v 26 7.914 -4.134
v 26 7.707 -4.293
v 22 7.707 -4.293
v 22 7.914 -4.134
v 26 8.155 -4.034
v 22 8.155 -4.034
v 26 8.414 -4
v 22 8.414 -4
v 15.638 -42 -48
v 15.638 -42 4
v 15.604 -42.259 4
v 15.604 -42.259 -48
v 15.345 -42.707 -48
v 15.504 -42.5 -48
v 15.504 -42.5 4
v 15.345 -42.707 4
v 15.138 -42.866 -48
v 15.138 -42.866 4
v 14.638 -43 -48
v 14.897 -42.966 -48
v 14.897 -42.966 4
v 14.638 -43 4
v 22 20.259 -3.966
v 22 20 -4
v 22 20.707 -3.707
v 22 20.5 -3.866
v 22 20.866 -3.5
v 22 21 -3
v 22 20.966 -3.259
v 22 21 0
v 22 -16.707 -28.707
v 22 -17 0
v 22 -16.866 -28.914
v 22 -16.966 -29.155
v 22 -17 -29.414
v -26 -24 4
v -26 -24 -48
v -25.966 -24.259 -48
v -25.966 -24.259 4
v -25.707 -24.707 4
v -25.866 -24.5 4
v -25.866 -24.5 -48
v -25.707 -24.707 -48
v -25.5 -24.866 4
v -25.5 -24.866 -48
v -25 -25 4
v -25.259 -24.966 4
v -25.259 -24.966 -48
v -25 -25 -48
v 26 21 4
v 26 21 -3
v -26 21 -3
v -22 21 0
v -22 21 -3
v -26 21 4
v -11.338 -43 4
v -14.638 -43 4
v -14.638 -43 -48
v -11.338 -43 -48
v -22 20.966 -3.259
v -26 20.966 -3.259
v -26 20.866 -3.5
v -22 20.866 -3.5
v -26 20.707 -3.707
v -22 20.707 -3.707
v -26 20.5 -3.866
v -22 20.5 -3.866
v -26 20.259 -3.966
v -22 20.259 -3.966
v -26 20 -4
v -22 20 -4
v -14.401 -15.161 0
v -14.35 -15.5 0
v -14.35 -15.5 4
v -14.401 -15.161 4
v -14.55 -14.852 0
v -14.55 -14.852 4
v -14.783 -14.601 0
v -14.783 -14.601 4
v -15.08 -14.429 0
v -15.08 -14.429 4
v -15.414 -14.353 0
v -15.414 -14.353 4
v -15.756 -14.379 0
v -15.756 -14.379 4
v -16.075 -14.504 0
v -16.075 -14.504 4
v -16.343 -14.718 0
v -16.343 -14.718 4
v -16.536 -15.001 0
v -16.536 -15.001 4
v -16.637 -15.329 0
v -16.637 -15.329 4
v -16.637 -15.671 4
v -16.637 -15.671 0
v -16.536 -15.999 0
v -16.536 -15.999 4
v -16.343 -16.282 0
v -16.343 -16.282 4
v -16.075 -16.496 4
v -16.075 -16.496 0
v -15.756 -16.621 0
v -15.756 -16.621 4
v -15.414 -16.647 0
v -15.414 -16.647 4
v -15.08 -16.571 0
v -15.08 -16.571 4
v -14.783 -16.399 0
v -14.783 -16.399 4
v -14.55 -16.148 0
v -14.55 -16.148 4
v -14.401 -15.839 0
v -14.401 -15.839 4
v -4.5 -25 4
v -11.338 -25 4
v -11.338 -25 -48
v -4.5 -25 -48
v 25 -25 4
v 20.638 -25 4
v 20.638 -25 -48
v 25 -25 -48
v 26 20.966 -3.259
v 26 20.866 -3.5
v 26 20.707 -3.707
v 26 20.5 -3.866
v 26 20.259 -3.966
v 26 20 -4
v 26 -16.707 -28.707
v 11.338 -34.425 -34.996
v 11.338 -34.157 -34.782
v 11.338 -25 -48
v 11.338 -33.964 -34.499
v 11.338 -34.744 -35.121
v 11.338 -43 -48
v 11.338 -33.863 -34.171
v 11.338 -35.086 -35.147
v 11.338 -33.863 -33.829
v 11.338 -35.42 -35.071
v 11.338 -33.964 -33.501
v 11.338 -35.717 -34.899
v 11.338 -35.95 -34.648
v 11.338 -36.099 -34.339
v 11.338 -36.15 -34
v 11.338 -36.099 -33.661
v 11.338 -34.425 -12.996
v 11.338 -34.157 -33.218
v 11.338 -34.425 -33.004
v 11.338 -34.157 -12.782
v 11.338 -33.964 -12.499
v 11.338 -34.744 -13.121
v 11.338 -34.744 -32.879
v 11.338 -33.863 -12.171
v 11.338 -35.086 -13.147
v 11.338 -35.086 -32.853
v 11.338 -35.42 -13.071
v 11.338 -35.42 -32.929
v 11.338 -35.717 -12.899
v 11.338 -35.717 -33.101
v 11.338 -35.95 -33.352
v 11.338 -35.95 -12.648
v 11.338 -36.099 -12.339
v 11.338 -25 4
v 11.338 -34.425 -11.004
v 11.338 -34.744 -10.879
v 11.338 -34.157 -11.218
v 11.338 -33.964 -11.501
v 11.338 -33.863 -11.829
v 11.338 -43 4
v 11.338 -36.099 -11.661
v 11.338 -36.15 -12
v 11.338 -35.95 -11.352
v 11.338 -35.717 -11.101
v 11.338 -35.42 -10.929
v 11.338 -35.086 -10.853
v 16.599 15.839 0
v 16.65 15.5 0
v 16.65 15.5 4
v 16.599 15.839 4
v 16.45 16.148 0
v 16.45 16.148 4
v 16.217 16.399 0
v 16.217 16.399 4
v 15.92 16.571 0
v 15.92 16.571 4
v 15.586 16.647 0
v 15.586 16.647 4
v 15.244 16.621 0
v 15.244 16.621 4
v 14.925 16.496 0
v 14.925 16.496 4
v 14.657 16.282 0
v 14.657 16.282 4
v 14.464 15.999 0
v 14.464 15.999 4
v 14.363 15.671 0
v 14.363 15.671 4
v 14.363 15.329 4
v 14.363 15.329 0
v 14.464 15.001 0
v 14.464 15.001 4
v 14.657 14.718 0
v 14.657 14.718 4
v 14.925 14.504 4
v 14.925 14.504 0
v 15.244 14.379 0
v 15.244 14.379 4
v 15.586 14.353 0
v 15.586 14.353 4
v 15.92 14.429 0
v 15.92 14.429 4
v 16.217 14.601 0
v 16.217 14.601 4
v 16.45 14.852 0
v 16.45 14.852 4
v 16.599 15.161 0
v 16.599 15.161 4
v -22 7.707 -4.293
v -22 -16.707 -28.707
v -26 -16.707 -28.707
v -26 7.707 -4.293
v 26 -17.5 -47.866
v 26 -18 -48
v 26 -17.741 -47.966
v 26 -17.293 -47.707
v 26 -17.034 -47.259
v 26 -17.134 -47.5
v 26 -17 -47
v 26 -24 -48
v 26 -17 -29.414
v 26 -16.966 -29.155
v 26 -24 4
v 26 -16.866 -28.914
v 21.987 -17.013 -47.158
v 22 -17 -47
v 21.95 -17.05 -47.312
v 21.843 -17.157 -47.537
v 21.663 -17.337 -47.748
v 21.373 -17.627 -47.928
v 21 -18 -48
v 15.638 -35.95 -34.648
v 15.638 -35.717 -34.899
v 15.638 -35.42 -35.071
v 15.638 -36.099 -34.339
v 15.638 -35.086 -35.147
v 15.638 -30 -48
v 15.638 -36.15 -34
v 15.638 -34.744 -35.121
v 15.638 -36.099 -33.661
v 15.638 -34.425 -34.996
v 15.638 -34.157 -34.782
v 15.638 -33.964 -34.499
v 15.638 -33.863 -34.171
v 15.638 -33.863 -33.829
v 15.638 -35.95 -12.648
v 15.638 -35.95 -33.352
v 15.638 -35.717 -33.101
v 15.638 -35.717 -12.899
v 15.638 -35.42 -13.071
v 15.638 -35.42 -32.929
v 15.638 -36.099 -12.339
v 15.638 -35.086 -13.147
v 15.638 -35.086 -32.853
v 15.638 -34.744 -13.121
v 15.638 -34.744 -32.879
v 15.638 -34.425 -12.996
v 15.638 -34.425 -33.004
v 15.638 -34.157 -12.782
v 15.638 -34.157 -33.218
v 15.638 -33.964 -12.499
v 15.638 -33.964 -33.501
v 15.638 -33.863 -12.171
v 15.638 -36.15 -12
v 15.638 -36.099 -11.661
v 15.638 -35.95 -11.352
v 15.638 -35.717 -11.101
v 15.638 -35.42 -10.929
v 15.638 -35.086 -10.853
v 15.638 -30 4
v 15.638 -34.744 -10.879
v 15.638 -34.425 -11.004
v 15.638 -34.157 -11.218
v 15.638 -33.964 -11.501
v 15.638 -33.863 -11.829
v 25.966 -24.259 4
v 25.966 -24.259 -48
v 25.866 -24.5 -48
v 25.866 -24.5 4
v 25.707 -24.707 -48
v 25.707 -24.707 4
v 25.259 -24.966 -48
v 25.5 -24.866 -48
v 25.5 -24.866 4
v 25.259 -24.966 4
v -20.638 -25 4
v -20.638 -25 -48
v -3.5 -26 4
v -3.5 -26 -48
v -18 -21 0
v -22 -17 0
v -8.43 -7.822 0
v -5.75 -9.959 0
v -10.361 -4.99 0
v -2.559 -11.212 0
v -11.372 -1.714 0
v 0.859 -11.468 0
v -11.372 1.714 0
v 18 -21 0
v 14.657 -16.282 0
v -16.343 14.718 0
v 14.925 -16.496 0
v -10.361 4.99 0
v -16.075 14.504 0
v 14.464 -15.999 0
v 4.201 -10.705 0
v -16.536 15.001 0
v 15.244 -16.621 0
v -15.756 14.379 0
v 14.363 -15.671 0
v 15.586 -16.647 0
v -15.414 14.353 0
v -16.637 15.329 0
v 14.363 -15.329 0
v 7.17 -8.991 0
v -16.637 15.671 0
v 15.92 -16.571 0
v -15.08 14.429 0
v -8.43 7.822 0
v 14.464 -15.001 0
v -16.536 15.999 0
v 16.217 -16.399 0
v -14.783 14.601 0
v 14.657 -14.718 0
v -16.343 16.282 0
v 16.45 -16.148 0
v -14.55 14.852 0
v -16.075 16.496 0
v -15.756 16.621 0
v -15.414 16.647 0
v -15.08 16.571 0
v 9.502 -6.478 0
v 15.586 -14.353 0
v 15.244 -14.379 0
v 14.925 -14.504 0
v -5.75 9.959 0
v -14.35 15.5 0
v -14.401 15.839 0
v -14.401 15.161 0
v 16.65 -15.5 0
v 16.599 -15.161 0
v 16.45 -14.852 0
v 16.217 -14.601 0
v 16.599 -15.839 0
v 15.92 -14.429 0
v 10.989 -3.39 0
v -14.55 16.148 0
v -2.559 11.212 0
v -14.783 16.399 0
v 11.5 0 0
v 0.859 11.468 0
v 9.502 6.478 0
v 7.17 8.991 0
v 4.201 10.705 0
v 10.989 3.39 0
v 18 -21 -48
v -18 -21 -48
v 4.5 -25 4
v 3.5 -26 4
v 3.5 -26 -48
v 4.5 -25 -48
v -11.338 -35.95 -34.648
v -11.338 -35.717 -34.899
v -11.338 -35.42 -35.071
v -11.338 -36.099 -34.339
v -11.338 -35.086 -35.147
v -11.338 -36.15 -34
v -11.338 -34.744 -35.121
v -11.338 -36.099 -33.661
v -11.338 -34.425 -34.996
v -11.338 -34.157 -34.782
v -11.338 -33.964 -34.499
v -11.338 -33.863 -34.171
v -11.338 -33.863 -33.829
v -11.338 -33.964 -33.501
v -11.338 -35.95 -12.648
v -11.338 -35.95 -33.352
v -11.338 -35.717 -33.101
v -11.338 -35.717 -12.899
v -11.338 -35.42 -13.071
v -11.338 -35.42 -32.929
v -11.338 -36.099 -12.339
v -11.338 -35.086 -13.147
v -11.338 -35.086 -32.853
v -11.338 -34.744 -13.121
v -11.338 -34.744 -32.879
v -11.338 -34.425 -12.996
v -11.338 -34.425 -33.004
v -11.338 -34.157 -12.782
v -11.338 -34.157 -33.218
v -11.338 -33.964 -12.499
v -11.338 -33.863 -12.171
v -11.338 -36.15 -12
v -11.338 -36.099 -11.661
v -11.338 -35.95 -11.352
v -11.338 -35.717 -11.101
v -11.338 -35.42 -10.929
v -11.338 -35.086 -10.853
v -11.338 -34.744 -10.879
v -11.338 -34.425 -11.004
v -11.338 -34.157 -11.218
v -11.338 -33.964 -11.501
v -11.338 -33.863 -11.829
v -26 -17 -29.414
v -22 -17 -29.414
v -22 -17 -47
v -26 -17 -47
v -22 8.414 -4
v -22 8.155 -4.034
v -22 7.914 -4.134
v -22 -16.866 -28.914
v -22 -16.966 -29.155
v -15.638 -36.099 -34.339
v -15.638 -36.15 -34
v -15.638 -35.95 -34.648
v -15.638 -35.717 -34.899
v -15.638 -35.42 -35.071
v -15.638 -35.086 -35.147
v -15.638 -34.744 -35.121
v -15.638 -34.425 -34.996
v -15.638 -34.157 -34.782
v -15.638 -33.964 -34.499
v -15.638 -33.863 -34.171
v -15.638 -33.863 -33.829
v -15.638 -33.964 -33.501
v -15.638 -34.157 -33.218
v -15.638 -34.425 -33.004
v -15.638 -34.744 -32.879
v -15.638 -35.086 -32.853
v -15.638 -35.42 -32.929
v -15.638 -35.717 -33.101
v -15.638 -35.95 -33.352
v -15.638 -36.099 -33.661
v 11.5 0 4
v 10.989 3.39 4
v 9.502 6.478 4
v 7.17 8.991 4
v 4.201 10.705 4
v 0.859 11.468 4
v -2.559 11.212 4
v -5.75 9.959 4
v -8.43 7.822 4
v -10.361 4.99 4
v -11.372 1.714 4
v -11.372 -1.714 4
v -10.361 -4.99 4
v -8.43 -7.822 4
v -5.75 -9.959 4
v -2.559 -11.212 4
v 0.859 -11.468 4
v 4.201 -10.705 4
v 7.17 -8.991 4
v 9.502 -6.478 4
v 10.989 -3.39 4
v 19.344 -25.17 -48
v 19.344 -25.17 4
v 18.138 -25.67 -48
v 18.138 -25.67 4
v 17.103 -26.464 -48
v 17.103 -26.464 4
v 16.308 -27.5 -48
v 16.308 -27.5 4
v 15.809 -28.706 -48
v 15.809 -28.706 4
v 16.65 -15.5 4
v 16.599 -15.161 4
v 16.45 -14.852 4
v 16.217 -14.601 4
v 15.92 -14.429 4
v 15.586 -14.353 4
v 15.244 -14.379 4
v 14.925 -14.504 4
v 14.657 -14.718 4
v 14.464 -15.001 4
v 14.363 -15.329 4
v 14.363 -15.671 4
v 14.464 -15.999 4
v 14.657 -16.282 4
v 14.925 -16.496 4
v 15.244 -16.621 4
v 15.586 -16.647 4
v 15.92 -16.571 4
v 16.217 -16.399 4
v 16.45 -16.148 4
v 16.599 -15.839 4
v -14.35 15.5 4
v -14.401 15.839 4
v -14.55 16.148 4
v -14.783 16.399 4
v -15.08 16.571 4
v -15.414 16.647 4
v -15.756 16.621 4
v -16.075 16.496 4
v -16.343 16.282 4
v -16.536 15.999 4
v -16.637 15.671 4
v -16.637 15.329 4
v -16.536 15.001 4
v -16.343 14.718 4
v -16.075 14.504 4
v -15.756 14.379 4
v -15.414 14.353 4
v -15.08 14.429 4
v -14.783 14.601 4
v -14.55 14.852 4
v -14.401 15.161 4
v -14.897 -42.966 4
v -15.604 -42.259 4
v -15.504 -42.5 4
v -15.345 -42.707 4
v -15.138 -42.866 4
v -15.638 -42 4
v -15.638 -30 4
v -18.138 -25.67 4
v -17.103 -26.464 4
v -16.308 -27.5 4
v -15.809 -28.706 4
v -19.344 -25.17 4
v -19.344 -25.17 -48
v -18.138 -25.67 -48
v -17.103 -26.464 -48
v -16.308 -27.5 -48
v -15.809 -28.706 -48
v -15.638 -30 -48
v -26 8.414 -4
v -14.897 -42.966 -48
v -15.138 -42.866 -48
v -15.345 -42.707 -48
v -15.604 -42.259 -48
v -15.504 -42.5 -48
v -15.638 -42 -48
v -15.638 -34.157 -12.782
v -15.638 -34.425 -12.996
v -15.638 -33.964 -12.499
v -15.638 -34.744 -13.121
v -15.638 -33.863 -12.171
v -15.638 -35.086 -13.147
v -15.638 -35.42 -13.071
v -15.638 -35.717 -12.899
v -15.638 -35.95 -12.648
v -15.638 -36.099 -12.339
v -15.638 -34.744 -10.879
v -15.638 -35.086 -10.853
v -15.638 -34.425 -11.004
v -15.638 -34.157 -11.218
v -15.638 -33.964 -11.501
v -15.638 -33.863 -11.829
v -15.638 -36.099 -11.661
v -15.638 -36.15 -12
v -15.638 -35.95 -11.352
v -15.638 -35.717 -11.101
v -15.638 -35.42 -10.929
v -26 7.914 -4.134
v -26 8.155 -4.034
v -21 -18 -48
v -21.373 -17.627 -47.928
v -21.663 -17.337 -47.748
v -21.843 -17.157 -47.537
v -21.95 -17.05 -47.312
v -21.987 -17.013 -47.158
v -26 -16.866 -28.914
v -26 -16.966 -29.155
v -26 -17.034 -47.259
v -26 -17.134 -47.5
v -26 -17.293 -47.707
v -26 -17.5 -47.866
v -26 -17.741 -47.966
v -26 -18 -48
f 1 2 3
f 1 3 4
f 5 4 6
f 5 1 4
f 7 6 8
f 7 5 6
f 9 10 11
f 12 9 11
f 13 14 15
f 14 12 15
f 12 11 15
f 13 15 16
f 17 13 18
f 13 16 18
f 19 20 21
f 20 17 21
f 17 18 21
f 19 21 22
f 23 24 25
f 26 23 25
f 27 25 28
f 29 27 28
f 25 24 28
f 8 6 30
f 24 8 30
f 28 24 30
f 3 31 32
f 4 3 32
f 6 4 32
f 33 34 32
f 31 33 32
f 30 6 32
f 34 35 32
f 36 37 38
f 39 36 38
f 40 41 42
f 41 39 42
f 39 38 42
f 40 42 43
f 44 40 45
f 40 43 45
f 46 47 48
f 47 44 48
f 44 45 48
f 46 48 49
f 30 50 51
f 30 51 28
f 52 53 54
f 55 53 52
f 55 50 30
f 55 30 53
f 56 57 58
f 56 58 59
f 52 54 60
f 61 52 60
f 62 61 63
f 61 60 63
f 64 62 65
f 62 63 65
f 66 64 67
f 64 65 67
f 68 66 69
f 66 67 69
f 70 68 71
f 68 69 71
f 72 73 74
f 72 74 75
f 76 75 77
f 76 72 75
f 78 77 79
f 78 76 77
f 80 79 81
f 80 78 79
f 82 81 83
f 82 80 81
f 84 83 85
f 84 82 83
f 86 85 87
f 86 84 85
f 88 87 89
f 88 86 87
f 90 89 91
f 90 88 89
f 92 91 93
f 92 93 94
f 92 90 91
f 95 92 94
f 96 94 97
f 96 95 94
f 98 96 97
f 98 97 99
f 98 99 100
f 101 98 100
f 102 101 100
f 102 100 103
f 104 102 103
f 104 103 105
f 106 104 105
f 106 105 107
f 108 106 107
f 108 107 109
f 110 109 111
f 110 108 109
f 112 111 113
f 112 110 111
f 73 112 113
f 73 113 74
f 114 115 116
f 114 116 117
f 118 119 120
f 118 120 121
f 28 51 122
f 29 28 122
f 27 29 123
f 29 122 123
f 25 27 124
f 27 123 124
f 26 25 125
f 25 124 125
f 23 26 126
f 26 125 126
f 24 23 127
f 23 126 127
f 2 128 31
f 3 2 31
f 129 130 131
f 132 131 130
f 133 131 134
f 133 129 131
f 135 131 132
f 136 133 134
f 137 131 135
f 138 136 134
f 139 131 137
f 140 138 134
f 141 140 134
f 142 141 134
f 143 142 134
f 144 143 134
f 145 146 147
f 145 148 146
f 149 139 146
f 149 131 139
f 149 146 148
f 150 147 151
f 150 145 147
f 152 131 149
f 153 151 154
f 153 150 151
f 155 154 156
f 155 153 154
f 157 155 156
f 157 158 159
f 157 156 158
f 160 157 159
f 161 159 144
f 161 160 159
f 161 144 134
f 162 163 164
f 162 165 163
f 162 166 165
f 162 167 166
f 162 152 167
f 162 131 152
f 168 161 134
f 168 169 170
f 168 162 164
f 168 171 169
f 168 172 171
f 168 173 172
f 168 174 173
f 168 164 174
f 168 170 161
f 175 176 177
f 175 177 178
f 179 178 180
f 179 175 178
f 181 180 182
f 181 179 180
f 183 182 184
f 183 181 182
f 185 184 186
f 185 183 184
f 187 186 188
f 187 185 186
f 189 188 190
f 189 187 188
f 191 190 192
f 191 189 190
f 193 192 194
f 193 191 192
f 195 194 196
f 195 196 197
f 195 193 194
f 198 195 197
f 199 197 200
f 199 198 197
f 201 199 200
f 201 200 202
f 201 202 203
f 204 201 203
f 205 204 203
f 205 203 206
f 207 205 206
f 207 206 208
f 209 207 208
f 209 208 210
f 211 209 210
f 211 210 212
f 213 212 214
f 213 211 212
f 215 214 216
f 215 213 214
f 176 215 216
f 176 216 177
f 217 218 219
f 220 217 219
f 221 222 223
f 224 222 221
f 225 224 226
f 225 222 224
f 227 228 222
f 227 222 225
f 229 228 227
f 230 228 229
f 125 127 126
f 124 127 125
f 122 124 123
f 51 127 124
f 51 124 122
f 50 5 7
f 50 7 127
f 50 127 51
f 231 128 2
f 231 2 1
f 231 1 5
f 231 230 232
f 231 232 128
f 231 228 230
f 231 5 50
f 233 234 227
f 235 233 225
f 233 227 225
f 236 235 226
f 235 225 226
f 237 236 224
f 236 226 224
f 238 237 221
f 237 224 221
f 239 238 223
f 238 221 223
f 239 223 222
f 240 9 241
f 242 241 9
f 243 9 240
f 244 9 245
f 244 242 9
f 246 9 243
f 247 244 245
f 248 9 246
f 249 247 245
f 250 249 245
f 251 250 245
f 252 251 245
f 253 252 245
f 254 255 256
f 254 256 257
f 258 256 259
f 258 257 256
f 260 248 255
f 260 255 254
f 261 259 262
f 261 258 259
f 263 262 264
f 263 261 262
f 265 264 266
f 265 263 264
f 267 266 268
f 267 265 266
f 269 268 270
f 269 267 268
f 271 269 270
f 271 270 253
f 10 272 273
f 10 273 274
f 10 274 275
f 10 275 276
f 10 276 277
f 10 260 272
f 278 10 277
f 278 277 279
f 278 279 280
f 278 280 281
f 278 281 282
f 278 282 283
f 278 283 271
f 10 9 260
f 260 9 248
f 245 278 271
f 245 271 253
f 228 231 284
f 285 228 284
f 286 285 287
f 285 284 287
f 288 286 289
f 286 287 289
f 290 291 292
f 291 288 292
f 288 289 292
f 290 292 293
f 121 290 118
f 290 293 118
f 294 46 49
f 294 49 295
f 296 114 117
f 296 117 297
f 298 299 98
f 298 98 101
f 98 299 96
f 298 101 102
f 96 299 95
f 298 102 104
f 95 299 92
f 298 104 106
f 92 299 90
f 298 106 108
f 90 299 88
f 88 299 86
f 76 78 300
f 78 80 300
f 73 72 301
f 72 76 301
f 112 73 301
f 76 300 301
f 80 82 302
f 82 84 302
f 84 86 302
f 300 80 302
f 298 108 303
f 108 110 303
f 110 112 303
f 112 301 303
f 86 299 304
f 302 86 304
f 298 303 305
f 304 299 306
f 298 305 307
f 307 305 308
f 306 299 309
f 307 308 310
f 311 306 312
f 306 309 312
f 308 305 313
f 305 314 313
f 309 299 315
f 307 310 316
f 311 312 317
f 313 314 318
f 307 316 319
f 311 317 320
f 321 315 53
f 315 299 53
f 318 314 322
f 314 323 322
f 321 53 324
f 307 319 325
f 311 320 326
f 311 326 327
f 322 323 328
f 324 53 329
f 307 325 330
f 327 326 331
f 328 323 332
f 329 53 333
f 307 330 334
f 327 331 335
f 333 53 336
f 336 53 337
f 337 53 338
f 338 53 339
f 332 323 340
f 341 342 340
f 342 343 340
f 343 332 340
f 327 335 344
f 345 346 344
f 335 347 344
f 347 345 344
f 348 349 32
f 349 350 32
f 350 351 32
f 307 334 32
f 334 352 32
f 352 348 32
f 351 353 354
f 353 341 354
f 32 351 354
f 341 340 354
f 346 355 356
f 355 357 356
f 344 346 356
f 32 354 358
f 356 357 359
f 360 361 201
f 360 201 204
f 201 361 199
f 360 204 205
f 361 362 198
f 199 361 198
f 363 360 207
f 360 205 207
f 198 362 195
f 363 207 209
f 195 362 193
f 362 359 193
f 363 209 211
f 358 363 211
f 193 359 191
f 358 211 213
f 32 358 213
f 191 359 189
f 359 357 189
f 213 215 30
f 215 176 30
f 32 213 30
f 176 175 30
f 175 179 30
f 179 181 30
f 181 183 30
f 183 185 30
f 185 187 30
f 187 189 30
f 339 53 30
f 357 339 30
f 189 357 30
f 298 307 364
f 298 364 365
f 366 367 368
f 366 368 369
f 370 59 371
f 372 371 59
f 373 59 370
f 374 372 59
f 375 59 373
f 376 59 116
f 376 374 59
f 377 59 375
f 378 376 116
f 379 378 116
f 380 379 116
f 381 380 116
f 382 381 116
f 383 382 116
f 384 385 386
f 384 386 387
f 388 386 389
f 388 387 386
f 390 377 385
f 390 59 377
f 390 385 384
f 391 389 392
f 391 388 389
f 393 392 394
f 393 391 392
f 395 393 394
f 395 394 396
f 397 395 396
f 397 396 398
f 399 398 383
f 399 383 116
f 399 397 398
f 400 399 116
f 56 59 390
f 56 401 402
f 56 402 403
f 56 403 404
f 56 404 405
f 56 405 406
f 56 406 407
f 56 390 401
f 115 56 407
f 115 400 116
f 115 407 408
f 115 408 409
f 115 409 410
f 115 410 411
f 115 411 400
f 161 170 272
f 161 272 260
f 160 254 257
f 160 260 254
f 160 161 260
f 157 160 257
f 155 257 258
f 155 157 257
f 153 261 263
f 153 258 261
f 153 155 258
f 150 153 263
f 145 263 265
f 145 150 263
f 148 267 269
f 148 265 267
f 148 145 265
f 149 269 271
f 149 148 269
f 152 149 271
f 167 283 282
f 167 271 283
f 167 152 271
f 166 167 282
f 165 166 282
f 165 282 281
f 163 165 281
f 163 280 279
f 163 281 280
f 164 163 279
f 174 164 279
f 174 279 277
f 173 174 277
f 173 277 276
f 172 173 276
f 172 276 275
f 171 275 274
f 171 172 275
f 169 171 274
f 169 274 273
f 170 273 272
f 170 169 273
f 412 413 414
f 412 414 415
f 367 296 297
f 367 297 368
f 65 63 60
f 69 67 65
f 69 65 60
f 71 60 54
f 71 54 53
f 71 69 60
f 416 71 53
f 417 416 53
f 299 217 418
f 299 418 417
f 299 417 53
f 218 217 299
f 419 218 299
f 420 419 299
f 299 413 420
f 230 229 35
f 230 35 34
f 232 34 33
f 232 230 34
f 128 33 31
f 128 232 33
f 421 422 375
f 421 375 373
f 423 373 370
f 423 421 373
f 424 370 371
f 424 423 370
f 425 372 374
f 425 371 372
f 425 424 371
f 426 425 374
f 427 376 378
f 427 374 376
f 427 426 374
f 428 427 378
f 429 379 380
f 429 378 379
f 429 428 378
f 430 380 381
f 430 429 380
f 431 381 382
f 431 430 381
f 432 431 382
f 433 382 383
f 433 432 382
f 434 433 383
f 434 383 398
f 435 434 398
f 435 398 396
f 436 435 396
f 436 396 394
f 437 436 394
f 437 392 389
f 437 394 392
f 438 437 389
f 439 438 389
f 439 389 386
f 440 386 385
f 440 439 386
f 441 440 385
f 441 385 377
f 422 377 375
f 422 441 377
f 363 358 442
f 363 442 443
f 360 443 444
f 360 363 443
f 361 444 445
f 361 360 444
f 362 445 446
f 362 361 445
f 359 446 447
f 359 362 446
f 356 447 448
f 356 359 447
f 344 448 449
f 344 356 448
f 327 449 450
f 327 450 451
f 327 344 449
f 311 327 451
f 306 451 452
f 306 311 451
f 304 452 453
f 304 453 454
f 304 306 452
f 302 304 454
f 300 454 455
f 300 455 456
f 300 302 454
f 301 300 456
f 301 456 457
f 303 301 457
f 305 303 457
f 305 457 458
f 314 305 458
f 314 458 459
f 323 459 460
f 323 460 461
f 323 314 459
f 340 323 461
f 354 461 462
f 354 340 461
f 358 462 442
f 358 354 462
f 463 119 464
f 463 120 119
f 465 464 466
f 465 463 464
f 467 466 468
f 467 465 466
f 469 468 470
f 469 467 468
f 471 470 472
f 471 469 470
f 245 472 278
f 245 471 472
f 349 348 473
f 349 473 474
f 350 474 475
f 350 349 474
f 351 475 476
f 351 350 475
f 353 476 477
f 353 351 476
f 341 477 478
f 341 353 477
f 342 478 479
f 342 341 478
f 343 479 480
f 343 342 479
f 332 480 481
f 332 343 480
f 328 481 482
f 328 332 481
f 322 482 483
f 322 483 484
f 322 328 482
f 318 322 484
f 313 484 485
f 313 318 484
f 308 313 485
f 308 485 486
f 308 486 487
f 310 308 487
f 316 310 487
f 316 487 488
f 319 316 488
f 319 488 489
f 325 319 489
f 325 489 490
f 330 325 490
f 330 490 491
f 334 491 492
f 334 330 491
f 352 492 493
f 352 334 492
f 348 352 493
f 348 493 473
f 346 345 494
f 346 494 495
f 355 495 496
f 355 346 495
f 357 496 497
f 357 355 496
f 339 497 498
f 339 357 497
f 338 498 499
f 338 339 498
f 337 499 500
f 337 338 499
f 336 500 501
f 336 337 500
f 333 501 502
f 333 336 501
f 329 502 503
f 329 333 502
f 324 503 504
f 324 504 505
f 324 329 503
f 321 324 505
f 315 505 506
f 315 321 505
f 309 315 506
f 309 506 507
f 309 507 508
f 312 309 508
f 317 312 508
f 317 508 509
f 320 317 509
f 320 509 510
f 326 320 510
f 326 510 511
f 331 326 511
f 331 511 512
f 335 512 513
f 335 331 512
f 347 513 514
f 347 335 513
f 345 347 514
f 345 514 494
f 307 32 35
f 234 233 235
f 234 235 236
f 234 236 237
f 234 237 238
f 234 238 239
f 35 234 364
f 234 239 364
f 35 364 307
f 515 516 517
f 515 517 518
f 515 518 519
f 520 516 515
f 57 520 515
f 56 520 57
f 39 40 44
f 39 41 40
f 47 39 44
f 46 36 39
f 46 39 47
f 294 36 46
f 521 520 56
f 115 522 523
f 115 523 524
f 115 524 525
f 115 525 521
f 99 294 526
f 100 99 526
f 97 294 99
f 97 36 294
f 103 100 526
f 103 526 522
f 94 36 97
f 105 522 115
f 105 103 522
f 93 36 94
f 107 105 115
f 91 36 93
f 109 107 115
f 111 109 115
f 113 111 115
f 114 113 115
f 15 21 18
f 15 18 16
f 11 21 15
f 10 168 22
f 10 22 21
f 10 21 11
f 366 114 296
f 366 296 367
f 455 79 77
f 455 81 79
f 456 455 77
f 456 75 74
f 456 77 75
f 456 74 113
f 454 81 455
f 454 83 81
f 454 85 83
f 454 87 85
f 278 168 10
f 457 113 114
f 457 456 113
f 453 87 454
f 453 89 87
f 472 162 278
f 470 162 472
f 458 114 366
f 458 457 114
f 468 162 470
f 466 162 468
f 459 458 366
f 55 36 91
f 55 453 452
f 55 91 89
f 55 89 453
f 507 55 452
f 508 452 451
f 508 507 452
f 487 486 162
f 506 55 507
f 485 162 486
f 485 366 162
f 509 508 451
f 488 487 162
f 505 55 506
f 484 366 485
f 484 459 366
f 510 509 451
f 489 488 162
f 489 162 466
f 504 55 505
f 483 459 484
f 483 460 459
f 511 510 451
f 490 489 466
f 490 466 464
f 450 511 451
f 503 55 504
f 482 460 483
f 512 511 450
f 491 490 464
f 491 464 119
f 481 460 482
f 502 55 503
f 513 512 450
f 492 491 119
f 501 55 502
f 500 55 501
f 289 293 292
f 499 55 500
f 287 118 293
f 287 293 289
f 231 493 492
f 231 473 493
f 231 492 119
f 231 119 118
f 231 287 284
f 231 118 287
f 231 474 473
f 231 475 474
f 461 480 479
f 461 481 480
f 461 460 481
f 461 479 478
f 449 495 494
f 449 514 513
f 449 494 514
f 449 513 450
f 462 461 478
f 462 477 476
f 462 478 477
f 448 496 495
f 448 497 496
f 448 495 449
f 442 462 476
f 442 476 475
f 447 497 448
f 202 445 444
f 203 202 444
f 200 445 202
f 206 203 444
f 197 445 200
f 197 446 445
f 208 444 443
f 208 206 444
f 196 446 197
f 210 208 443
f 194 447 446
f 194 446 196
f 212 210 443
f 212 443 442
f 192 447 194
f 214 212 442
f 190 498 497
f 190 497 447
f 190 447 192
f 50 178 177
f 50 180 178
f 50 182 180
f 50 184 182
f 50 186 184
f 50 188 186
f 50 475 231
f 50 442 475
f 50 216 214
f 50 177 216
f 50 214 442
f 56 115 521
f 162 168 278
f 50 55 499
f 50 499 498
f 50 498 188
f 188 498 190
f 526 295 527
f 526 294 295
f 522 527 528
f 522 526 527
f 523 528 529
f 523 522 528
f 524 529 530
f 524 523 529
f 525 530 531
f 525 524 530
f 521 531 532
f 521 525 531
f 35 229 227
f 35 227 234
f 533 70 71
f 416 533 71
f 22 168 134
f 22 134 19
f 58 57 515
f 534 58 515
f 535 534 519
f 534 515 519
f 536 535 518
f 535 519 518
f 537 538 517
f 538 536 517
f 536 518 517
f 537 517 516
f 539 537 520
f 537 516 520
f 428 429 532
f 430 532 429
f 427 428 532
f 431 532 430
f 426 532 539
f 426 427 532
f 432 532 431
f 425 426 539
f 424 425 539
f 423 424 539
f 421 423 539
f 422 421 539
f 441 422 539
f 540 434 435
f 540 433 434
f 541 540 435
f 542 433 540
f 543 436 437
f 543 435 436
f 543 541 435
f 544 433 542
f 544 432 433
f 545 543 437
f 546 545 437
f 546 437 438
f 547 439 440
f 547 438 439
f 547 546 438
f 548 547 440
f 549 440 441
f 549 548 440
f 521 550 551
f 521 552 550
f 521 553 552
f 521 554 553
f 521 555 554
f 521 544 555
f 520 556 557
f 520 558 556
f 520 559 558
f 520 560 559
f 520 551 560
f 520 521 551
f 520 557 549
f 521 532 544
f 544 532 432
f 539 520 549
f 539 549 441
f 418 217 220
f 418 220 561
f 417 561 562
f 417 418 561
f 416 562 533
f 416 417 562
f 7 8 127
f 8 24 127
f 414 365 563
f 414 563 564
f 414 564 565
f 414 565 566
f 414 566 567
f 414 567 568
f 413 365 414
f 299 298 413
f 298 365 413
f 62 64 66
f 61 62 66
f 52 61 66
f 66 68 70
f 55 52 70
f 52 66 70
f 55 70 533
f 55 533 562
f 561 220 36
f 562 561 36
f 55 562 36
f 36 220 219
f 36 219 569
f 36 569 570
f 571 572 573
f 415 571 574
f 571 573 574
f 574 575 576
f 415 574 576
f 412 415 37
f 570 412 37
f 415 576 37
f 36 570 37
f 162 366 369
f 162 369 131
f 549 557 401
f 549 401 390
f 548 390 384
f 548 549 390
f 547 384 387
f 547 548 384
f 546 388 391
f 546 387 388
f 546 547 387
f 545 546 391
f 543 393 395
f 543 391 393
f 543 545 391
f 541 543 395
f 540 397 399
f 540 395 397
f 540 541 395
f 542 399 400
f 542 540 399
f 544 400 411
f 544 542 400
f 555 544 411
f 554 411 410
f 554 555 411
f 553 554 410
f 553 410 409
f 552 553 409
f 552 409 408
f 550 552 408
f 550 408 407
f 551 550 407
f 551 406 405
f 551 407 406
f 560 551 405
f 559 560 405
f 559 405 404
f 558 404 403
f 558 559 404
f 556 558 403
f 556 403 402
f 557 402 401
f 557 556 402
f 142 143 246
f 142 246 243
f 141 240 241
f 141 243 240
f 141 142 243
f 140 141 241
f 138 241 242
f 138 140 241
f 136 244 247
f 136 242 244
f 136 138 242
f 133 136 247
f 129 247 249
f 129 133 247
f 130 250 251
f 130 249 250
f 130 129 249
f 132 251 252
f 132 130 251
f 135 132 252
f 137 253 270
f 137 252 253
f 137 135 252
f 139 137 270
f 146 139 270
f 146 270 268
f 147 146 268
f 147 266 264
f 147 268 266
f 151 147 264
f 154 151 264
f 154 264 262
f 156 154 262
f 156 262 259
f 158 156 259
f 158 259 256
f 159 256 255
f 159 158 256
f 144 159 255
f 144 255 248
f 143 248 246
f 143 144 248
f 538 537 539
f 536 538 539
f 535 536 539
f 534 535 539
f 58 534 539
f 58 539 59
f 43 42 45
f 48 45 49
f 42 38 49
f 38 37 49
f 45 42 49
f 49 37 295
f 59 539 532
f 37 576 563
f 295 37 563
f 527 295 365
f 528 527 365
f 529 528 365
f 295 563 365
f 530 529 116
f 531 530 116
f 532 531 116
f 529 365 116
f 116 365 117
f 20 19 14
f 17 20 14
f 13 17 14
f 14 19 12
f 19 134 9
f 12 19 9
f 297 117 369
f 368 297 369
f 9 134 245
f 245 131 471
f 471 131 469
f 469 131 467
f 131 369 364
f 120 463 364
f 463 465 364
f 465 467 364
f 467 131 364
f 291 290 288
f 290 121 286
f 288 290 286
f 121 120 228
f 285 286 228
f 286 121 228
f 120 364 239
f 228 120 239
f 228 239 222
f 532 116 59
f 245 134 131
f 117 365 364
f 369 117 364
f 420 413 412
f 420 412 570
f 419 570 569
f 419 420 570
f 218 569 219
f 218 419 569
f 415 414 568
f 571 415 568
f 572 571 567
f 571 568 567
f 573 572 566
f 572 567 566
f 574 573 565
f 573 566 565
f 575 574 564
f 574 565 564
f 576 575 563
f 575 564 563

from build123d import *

# Parameters (mm, degrees)
SKETCH1_W               = 52
SKETCH1_H               = 46
SKETCH1_R               = 1.15
SKETCH1_R_2             = 11.5
SKETCH1_W_2             = 4.3
SKETCH1_H_2             = 18
BOSS_EXTRUDE1_DEPTH     = 4
BOSS_EXTRUDE2_DEPTH     = 4
BOSS_EXTRUDE3_DEPTH     = 44
CHAMFER1_SIZE           = 25
CUT_EXTRUDE1_DEPTH      = 70.491006612
CUT_EXTRUDE1_DEPTH_BACK = 70.491006612
SKETCH4_R               = 1.15
FILLET1_R               = 5
FILLET2_R               = 1


with BuildPart() as part:
    # Sketch1 → Boss-Extrude1 (new body)
    # profile 1 of 4: a face of its own
    with BuildSketch(Plane.XY):
        with Locations((0, -2)):
            Rectangle(SKETCH1_W, SKETCH1_H)
        with Locations((15.5, 15.5)):
            Circle(SKETCH1_R, mode=Mode.SUBTRACT)
        with Locations((15.5, -15.5)):
            Circle(SKETCH1_R, mode=Mode.SUBTRACT)
        with Locations((-15.5, -15.5)):
            Circle(SKETCH1_R, mode=Mode.SUBTRACT)
        with Locations((-15.5, 15.5)):
            Circle(SKETCH1_R, mode=Mode.SUBTRACT)
        Circle(SKETCH1_R_2, mode=Mode.SUBTRACT)
    # profile 2 of 4: a face of its own
    with BuildSketch(Plane.XY):
        with Locations((-13.488188518, -34)):
            Rectangle(SKETCH1_W_2, SKETCH1_H_2)
    # profile 3 of 4: a face of its own
    with BuildSketch(Plane.XY):
        with Locations((13.488188518, -34)):
            Rectangle(SKETCH1_W_2, SKETCH1_H_2)
    # profile 4 of 4: a face of its own
    with BuildSketch(Plane.XY):
        Polygon((3.5, -26), (4.5, -25), (-4.5, -25), (-3.5, -26), align=None)
    extrude(amount=BOSS_EXTRUDE1_DEPTH)

    # Sketch2 → Boss-Extrude2 (add)
    with BuildSketch(Plane.XY):
        Polygon((26, 21), (22, 21), (22, -17), (18, -21), (-18, -21), (-22, -17), (-22, 21), (-26, 21), (-26, -25), (-15.638188518, -25), (-15.638188518, -43), (-11.338188518, -43), (-11.338188518, -25), (-4.5, -25), (-3.5, -26), (3.5, -26), (4.5, -25), (11.338188518, -25), (11.338188518, -43), (15.638188518, -43), (15.638188518, -25), (26, -25), align=None)
    extrude(amount=-BOSS_EXTRUDE2_DEPTH)

    # Sketch3 → Boss-Extrude3 (add)
    with BuildSketch(Plane(origin=(0, 0, -4), x_dir=(-1, 0, 0), z_dir=(0, 0, -1))):
        Polygon((-26, -25), (-26, -17), (-22, -17), (-18, -21), (18, -21), (22, -17), (26, -17), (26, -25), (15.638188518, -25), (15.638188518, -43), (11.338188518, -43), (11.338188518, -25), (4.5, -25), (3.5, -26), (-3.5, -26), (-4.5, -25), (-11.338188518, -25), (-11.338188518, -43), (-15.638188518, -43), (-15.638188518, -25), align=None)
    extrude(amount=BOSS_EXTRUDE3_DEPTH)

    # Chamfer1
    chamfer1_edges = [part.edges().sort_by_distance(p)[0] for p in [
        (-24, -17, -4),
        (24, -17, -4),
    ]]
    chamfer(chamfer1_edges, length=CHAMFER1_SIZE)

    # Sketch4 → Cut-Extrude1 (cut, two sides: drawn at the far end of the back side and taken through both)
    with BuildSketch(Plane(origin=(0, 0, 0), x_dir=(0, 0, -1), z_dir=(1, 0, 0)).offset(-CUT_EXTRUDE1_DEPTH_BACK)):
        with Locations(Location((34, -35, 0), (0, 0, 270))):
            Circle(SKETCH4_R)
        with Locations(Location((12, -35, 0), (0, 0, 270))):
            Circle(SKETCH4_R)
    extrude(amount=CUT_EXTRUDE1_DEPTH + CUT_EXTRUDE1_DEPTH_BACK, mode=Mode.SUBTRACT)

    # Fillet1
    fillet1_edges = [part.edges().sort_by_distance(p)[0] for p in [
        (15.638188518, -25, -22),
        (-15.638188518, -25, -22),
    ]]
    fillet(fillet1_edges, radius=FILLET1_R)

    # Fillet2
    # the kernel refuses this fillet: 1 mm, written as the material it adds along each edge
    with BuildSketch(Plane(origin=(-22, -17, -29), x_dir=(0, 0.7071067811865475, 0.7071067811865475), z_dir=(-1, 0, 0))) as fillet2_piece_1_section:
        with BuildLine():
            CenterArc((FILLET2_R * 0.414213562373, FILLET2_R), FILLET2_R, 225, 45)
            Line((-FILLET2_R * 0.292893218813, FILLET2_R * 0.292893218813), (0, 0))
            Line((0, 0), (FILLET2_R * 0.414213562373, 0))
        make_face()
    fillet2_piece_1 = extrude(amount=4, mode=Mode.PRIVATE)
    fillet2_piece_1 = split(fillet2_piece_1, bisect_by=Plane(origin=(-22.109509858, -16.890490142, -28.87205582), z_dir=(0.7071067811865658, 0.7071067811865294, 0)), keep=Keep.TOP, mode=Mode.PRIVATE)
    add(fillet2_piece_1)
    with BuildSketch(Plane(origin=(-22, -17, -29), x_dir=(0, 0.7071067811865475, 0.7071067811865475), z_dir=(-1, 0, 0))) as fillet2_piece_2_section:
        with BuildLine():
            CenterArc((FILLET2_R * 0.414213562373, FILLET2_R), FILLET2_R, 225, 45)
            Line((-FILLET2_R * 0.292893218813, FILLET2_R * 0.292893218813), (0, 0))
            Line((0, 0), (FILLET2_R * 0.414213562373, 0))
        make_face()
    fillet2_piece_2 = extrude(amount=4, mode=Mode.PRIVATE)
    fillet2_piece_2 = split(fillet2_piece_2, bisect_by=Plane(origin=(-23.045900005, -15.954099995, -29.028101444), z_dir=(-0.7071067811865658, -0.7071067811865294, 0)), keep=Keep.TOP, mode=Mode.PRIVATE)
    add(fillet2_piece_2)
    with BuildSketch(Plane(origin=(-22, 8, -4), x_dir=(0, 1, 0), z_dir=(-1, 0, 0))) as fillet2_piece_3:
        with BuildLine():
            CenterArc((FILLET2_R * 0.414213562373, FILLET2_R), FILLET2_R, 225, 45)
            Line((-FILLET2_R * 0.292893218813, FILLET2_R * 0.292893218813), (0, 0))
            Line((0, 0), (FILLET2_R * 0.414213562373, 0))
        make_face()
    extrude(amount=4)
    with BuildSketch(Plane(origin=(26, -17, -29), x_dir=(0, 0, -1), z_dir=(-1, 0, 0))) as fillet2_piece_4_section:
        with BuildLine():
            CenterArc((FILLET2_R * 0.414213562373, -FILLET2_R), FILLET2_R, 90, 45)
            Line((-FILLET2_R * 0.292893218813, -FILLET2_R * 0.292893218813), (0, 0))
            Line((0, 0), (FILLET2_R * 0.414213562373, 0))
        make_face()
    fillet2_piece_4 = extrude(amount=4, mode=Mode.PRIVATE)
    fillet2_piece_4 = split(fillet2_piece_4, bisect_by=Plane(origin=(23.045900005, -15.954099995, -29.028101444), z_dir=(0.7071067811865454, -0.7071067811865498, 0)), keep=Keep.TOP, mode=Mode.PRIVATE)
    add(fillet2_piece_4)
    with BuildSketch(Plane(origin=(26, -17, -29), x_dir=(0, 0, -1), z_dir=(-1, 0, 0))) as fillet2_piece_5_section:
        with BuildLine():
            CenterArc((FILLET2_R * 0.414213562373, -FILLET2_R), FILLET2_R, 90, 45)
            Line((-FILLET2_R * 0.292893218813, -FILLET2_R * 0.292893218813), (0, 0))
            Line((0, 0), (FILLET2_R * 0.414213562373, 0))
        make_face()
    fillet2_piece_5 = extrude(amount=4, mode=Mode.PRIVATE)
    fillet2_piece_5 = split(fillet2_piece_5, bisect_by=Plane(origin=(22.109509858, -16.890490142, -28.87205582), z_dir=(-0.7071067811865454, 0.7071067811865498, 0)), keep=Keep.TOP, mode=Mode.PRIVATE)
    add(fillet2_piece_5)
    with BuildSketch(Plane(origin=(26, 8, -4), x_dir=(0, -0.7071067811865475, -0.7071067811865475), z_dir=(-1, 0, 0))) as fillet2_piece_6:
        with BuildLine():
            CenterArc((FILLET2_R * 0.414213562373, -FILLET2_R), FILLET2_R, 90, 45)
            Line((-FILLET2_R * 0.292893218813, -FILLET2_R * 0.292893218813), (0, 0))
            Line((0, 0), (FILLET2_R * 0.414213562373, 0))
        make_face()
    extrude(amount=4)
    # the kernel refuses this fillet: 1 mm, written as the material it takes off along each edge
    with BuildSketch(Plane(origin=(-19.5, -17, -48), x_dir=(0, -1, 0), z_dir=(-1, 0, 0)), Plane(origin=(-19.5, 21, -4), x_dir=(0, -1, 0), z_dir=(-1, 0, 0)), Plane(origin=(28.5, 21, -4), x_dir=(0, -1, 0), z_dir=(-1, 0, 0))) as fillet2_2_piece_1:
        with BuildLine():
            CenterArc((FILLET2_R, FILLET2_R), FILLET2_R, 180, 90)
            Line((0, FILLET2_R), (0, 0))
            Line((0, 0), (FILLET2_R, 0))
        make_face()
    extrude(amount=9, mode=Mode.SUBTRACT)
    with BuildSketch(Plane(origin=(28.5, -17, -48), x_dir=(0, 0, 1), z_dir=(-1, 0, 0))) as fillet2_2_piece_2:
        with BuildLine():
            CenterArc((FILLET2_R, -FILLET2_R), FILLET2_R, 90, 90)
            Line((0, -FILLET2_R), (0, 0))
            Line((0, 0), (FILLET2_R, 0))
        make_face()
    extrude(amount=9, mode=Mode.SUBTRACT)
    with BuildSketch(Plane(origin=(26, -25, 6.5), x_dir=(0, 1, 0), z_dir=(0, 0, -1)), Plane(origin=(-15.638188518, -43, 6.5), x_dir=(1, 0, 0), z_dir=(0, 0, -1))) as fillet2_2_piece_3:
        with BuildLine():
            CenterArc((FILLET2_R, -FILLET2_R), FILLET2_R, 90, 90)
            Line((0, -FILLET2_R), (0, 0))
            Line((0, 0), (FILLET2_R, 0))
        make_face()
    extrude(amount=57, mode=Mode.SUBTRACT)
    with BuildSketch(Plane(origin=(15.638188518, -43, 6.5), x_dir=(-1, 0, 0), z_dir=(0, 0, -1)), Plane(origin=(-26, -25, -50.5), x_dir=(1, 0, 0), z_dir=(0, 0, 1))) as fillet2_2_piece_4:
        with BuildLine():
            CenterArc((FILLET2_R, FILLET2_R), FILLET2_R, 180, 90)
            Line((0, FILLET2_R), (0, 0))
            Line((0, 0), (FILLET2_R, 0))
        make_face()
    extrude(amount=57, mode=Mode.SUBTRACT)


solid = part.part
